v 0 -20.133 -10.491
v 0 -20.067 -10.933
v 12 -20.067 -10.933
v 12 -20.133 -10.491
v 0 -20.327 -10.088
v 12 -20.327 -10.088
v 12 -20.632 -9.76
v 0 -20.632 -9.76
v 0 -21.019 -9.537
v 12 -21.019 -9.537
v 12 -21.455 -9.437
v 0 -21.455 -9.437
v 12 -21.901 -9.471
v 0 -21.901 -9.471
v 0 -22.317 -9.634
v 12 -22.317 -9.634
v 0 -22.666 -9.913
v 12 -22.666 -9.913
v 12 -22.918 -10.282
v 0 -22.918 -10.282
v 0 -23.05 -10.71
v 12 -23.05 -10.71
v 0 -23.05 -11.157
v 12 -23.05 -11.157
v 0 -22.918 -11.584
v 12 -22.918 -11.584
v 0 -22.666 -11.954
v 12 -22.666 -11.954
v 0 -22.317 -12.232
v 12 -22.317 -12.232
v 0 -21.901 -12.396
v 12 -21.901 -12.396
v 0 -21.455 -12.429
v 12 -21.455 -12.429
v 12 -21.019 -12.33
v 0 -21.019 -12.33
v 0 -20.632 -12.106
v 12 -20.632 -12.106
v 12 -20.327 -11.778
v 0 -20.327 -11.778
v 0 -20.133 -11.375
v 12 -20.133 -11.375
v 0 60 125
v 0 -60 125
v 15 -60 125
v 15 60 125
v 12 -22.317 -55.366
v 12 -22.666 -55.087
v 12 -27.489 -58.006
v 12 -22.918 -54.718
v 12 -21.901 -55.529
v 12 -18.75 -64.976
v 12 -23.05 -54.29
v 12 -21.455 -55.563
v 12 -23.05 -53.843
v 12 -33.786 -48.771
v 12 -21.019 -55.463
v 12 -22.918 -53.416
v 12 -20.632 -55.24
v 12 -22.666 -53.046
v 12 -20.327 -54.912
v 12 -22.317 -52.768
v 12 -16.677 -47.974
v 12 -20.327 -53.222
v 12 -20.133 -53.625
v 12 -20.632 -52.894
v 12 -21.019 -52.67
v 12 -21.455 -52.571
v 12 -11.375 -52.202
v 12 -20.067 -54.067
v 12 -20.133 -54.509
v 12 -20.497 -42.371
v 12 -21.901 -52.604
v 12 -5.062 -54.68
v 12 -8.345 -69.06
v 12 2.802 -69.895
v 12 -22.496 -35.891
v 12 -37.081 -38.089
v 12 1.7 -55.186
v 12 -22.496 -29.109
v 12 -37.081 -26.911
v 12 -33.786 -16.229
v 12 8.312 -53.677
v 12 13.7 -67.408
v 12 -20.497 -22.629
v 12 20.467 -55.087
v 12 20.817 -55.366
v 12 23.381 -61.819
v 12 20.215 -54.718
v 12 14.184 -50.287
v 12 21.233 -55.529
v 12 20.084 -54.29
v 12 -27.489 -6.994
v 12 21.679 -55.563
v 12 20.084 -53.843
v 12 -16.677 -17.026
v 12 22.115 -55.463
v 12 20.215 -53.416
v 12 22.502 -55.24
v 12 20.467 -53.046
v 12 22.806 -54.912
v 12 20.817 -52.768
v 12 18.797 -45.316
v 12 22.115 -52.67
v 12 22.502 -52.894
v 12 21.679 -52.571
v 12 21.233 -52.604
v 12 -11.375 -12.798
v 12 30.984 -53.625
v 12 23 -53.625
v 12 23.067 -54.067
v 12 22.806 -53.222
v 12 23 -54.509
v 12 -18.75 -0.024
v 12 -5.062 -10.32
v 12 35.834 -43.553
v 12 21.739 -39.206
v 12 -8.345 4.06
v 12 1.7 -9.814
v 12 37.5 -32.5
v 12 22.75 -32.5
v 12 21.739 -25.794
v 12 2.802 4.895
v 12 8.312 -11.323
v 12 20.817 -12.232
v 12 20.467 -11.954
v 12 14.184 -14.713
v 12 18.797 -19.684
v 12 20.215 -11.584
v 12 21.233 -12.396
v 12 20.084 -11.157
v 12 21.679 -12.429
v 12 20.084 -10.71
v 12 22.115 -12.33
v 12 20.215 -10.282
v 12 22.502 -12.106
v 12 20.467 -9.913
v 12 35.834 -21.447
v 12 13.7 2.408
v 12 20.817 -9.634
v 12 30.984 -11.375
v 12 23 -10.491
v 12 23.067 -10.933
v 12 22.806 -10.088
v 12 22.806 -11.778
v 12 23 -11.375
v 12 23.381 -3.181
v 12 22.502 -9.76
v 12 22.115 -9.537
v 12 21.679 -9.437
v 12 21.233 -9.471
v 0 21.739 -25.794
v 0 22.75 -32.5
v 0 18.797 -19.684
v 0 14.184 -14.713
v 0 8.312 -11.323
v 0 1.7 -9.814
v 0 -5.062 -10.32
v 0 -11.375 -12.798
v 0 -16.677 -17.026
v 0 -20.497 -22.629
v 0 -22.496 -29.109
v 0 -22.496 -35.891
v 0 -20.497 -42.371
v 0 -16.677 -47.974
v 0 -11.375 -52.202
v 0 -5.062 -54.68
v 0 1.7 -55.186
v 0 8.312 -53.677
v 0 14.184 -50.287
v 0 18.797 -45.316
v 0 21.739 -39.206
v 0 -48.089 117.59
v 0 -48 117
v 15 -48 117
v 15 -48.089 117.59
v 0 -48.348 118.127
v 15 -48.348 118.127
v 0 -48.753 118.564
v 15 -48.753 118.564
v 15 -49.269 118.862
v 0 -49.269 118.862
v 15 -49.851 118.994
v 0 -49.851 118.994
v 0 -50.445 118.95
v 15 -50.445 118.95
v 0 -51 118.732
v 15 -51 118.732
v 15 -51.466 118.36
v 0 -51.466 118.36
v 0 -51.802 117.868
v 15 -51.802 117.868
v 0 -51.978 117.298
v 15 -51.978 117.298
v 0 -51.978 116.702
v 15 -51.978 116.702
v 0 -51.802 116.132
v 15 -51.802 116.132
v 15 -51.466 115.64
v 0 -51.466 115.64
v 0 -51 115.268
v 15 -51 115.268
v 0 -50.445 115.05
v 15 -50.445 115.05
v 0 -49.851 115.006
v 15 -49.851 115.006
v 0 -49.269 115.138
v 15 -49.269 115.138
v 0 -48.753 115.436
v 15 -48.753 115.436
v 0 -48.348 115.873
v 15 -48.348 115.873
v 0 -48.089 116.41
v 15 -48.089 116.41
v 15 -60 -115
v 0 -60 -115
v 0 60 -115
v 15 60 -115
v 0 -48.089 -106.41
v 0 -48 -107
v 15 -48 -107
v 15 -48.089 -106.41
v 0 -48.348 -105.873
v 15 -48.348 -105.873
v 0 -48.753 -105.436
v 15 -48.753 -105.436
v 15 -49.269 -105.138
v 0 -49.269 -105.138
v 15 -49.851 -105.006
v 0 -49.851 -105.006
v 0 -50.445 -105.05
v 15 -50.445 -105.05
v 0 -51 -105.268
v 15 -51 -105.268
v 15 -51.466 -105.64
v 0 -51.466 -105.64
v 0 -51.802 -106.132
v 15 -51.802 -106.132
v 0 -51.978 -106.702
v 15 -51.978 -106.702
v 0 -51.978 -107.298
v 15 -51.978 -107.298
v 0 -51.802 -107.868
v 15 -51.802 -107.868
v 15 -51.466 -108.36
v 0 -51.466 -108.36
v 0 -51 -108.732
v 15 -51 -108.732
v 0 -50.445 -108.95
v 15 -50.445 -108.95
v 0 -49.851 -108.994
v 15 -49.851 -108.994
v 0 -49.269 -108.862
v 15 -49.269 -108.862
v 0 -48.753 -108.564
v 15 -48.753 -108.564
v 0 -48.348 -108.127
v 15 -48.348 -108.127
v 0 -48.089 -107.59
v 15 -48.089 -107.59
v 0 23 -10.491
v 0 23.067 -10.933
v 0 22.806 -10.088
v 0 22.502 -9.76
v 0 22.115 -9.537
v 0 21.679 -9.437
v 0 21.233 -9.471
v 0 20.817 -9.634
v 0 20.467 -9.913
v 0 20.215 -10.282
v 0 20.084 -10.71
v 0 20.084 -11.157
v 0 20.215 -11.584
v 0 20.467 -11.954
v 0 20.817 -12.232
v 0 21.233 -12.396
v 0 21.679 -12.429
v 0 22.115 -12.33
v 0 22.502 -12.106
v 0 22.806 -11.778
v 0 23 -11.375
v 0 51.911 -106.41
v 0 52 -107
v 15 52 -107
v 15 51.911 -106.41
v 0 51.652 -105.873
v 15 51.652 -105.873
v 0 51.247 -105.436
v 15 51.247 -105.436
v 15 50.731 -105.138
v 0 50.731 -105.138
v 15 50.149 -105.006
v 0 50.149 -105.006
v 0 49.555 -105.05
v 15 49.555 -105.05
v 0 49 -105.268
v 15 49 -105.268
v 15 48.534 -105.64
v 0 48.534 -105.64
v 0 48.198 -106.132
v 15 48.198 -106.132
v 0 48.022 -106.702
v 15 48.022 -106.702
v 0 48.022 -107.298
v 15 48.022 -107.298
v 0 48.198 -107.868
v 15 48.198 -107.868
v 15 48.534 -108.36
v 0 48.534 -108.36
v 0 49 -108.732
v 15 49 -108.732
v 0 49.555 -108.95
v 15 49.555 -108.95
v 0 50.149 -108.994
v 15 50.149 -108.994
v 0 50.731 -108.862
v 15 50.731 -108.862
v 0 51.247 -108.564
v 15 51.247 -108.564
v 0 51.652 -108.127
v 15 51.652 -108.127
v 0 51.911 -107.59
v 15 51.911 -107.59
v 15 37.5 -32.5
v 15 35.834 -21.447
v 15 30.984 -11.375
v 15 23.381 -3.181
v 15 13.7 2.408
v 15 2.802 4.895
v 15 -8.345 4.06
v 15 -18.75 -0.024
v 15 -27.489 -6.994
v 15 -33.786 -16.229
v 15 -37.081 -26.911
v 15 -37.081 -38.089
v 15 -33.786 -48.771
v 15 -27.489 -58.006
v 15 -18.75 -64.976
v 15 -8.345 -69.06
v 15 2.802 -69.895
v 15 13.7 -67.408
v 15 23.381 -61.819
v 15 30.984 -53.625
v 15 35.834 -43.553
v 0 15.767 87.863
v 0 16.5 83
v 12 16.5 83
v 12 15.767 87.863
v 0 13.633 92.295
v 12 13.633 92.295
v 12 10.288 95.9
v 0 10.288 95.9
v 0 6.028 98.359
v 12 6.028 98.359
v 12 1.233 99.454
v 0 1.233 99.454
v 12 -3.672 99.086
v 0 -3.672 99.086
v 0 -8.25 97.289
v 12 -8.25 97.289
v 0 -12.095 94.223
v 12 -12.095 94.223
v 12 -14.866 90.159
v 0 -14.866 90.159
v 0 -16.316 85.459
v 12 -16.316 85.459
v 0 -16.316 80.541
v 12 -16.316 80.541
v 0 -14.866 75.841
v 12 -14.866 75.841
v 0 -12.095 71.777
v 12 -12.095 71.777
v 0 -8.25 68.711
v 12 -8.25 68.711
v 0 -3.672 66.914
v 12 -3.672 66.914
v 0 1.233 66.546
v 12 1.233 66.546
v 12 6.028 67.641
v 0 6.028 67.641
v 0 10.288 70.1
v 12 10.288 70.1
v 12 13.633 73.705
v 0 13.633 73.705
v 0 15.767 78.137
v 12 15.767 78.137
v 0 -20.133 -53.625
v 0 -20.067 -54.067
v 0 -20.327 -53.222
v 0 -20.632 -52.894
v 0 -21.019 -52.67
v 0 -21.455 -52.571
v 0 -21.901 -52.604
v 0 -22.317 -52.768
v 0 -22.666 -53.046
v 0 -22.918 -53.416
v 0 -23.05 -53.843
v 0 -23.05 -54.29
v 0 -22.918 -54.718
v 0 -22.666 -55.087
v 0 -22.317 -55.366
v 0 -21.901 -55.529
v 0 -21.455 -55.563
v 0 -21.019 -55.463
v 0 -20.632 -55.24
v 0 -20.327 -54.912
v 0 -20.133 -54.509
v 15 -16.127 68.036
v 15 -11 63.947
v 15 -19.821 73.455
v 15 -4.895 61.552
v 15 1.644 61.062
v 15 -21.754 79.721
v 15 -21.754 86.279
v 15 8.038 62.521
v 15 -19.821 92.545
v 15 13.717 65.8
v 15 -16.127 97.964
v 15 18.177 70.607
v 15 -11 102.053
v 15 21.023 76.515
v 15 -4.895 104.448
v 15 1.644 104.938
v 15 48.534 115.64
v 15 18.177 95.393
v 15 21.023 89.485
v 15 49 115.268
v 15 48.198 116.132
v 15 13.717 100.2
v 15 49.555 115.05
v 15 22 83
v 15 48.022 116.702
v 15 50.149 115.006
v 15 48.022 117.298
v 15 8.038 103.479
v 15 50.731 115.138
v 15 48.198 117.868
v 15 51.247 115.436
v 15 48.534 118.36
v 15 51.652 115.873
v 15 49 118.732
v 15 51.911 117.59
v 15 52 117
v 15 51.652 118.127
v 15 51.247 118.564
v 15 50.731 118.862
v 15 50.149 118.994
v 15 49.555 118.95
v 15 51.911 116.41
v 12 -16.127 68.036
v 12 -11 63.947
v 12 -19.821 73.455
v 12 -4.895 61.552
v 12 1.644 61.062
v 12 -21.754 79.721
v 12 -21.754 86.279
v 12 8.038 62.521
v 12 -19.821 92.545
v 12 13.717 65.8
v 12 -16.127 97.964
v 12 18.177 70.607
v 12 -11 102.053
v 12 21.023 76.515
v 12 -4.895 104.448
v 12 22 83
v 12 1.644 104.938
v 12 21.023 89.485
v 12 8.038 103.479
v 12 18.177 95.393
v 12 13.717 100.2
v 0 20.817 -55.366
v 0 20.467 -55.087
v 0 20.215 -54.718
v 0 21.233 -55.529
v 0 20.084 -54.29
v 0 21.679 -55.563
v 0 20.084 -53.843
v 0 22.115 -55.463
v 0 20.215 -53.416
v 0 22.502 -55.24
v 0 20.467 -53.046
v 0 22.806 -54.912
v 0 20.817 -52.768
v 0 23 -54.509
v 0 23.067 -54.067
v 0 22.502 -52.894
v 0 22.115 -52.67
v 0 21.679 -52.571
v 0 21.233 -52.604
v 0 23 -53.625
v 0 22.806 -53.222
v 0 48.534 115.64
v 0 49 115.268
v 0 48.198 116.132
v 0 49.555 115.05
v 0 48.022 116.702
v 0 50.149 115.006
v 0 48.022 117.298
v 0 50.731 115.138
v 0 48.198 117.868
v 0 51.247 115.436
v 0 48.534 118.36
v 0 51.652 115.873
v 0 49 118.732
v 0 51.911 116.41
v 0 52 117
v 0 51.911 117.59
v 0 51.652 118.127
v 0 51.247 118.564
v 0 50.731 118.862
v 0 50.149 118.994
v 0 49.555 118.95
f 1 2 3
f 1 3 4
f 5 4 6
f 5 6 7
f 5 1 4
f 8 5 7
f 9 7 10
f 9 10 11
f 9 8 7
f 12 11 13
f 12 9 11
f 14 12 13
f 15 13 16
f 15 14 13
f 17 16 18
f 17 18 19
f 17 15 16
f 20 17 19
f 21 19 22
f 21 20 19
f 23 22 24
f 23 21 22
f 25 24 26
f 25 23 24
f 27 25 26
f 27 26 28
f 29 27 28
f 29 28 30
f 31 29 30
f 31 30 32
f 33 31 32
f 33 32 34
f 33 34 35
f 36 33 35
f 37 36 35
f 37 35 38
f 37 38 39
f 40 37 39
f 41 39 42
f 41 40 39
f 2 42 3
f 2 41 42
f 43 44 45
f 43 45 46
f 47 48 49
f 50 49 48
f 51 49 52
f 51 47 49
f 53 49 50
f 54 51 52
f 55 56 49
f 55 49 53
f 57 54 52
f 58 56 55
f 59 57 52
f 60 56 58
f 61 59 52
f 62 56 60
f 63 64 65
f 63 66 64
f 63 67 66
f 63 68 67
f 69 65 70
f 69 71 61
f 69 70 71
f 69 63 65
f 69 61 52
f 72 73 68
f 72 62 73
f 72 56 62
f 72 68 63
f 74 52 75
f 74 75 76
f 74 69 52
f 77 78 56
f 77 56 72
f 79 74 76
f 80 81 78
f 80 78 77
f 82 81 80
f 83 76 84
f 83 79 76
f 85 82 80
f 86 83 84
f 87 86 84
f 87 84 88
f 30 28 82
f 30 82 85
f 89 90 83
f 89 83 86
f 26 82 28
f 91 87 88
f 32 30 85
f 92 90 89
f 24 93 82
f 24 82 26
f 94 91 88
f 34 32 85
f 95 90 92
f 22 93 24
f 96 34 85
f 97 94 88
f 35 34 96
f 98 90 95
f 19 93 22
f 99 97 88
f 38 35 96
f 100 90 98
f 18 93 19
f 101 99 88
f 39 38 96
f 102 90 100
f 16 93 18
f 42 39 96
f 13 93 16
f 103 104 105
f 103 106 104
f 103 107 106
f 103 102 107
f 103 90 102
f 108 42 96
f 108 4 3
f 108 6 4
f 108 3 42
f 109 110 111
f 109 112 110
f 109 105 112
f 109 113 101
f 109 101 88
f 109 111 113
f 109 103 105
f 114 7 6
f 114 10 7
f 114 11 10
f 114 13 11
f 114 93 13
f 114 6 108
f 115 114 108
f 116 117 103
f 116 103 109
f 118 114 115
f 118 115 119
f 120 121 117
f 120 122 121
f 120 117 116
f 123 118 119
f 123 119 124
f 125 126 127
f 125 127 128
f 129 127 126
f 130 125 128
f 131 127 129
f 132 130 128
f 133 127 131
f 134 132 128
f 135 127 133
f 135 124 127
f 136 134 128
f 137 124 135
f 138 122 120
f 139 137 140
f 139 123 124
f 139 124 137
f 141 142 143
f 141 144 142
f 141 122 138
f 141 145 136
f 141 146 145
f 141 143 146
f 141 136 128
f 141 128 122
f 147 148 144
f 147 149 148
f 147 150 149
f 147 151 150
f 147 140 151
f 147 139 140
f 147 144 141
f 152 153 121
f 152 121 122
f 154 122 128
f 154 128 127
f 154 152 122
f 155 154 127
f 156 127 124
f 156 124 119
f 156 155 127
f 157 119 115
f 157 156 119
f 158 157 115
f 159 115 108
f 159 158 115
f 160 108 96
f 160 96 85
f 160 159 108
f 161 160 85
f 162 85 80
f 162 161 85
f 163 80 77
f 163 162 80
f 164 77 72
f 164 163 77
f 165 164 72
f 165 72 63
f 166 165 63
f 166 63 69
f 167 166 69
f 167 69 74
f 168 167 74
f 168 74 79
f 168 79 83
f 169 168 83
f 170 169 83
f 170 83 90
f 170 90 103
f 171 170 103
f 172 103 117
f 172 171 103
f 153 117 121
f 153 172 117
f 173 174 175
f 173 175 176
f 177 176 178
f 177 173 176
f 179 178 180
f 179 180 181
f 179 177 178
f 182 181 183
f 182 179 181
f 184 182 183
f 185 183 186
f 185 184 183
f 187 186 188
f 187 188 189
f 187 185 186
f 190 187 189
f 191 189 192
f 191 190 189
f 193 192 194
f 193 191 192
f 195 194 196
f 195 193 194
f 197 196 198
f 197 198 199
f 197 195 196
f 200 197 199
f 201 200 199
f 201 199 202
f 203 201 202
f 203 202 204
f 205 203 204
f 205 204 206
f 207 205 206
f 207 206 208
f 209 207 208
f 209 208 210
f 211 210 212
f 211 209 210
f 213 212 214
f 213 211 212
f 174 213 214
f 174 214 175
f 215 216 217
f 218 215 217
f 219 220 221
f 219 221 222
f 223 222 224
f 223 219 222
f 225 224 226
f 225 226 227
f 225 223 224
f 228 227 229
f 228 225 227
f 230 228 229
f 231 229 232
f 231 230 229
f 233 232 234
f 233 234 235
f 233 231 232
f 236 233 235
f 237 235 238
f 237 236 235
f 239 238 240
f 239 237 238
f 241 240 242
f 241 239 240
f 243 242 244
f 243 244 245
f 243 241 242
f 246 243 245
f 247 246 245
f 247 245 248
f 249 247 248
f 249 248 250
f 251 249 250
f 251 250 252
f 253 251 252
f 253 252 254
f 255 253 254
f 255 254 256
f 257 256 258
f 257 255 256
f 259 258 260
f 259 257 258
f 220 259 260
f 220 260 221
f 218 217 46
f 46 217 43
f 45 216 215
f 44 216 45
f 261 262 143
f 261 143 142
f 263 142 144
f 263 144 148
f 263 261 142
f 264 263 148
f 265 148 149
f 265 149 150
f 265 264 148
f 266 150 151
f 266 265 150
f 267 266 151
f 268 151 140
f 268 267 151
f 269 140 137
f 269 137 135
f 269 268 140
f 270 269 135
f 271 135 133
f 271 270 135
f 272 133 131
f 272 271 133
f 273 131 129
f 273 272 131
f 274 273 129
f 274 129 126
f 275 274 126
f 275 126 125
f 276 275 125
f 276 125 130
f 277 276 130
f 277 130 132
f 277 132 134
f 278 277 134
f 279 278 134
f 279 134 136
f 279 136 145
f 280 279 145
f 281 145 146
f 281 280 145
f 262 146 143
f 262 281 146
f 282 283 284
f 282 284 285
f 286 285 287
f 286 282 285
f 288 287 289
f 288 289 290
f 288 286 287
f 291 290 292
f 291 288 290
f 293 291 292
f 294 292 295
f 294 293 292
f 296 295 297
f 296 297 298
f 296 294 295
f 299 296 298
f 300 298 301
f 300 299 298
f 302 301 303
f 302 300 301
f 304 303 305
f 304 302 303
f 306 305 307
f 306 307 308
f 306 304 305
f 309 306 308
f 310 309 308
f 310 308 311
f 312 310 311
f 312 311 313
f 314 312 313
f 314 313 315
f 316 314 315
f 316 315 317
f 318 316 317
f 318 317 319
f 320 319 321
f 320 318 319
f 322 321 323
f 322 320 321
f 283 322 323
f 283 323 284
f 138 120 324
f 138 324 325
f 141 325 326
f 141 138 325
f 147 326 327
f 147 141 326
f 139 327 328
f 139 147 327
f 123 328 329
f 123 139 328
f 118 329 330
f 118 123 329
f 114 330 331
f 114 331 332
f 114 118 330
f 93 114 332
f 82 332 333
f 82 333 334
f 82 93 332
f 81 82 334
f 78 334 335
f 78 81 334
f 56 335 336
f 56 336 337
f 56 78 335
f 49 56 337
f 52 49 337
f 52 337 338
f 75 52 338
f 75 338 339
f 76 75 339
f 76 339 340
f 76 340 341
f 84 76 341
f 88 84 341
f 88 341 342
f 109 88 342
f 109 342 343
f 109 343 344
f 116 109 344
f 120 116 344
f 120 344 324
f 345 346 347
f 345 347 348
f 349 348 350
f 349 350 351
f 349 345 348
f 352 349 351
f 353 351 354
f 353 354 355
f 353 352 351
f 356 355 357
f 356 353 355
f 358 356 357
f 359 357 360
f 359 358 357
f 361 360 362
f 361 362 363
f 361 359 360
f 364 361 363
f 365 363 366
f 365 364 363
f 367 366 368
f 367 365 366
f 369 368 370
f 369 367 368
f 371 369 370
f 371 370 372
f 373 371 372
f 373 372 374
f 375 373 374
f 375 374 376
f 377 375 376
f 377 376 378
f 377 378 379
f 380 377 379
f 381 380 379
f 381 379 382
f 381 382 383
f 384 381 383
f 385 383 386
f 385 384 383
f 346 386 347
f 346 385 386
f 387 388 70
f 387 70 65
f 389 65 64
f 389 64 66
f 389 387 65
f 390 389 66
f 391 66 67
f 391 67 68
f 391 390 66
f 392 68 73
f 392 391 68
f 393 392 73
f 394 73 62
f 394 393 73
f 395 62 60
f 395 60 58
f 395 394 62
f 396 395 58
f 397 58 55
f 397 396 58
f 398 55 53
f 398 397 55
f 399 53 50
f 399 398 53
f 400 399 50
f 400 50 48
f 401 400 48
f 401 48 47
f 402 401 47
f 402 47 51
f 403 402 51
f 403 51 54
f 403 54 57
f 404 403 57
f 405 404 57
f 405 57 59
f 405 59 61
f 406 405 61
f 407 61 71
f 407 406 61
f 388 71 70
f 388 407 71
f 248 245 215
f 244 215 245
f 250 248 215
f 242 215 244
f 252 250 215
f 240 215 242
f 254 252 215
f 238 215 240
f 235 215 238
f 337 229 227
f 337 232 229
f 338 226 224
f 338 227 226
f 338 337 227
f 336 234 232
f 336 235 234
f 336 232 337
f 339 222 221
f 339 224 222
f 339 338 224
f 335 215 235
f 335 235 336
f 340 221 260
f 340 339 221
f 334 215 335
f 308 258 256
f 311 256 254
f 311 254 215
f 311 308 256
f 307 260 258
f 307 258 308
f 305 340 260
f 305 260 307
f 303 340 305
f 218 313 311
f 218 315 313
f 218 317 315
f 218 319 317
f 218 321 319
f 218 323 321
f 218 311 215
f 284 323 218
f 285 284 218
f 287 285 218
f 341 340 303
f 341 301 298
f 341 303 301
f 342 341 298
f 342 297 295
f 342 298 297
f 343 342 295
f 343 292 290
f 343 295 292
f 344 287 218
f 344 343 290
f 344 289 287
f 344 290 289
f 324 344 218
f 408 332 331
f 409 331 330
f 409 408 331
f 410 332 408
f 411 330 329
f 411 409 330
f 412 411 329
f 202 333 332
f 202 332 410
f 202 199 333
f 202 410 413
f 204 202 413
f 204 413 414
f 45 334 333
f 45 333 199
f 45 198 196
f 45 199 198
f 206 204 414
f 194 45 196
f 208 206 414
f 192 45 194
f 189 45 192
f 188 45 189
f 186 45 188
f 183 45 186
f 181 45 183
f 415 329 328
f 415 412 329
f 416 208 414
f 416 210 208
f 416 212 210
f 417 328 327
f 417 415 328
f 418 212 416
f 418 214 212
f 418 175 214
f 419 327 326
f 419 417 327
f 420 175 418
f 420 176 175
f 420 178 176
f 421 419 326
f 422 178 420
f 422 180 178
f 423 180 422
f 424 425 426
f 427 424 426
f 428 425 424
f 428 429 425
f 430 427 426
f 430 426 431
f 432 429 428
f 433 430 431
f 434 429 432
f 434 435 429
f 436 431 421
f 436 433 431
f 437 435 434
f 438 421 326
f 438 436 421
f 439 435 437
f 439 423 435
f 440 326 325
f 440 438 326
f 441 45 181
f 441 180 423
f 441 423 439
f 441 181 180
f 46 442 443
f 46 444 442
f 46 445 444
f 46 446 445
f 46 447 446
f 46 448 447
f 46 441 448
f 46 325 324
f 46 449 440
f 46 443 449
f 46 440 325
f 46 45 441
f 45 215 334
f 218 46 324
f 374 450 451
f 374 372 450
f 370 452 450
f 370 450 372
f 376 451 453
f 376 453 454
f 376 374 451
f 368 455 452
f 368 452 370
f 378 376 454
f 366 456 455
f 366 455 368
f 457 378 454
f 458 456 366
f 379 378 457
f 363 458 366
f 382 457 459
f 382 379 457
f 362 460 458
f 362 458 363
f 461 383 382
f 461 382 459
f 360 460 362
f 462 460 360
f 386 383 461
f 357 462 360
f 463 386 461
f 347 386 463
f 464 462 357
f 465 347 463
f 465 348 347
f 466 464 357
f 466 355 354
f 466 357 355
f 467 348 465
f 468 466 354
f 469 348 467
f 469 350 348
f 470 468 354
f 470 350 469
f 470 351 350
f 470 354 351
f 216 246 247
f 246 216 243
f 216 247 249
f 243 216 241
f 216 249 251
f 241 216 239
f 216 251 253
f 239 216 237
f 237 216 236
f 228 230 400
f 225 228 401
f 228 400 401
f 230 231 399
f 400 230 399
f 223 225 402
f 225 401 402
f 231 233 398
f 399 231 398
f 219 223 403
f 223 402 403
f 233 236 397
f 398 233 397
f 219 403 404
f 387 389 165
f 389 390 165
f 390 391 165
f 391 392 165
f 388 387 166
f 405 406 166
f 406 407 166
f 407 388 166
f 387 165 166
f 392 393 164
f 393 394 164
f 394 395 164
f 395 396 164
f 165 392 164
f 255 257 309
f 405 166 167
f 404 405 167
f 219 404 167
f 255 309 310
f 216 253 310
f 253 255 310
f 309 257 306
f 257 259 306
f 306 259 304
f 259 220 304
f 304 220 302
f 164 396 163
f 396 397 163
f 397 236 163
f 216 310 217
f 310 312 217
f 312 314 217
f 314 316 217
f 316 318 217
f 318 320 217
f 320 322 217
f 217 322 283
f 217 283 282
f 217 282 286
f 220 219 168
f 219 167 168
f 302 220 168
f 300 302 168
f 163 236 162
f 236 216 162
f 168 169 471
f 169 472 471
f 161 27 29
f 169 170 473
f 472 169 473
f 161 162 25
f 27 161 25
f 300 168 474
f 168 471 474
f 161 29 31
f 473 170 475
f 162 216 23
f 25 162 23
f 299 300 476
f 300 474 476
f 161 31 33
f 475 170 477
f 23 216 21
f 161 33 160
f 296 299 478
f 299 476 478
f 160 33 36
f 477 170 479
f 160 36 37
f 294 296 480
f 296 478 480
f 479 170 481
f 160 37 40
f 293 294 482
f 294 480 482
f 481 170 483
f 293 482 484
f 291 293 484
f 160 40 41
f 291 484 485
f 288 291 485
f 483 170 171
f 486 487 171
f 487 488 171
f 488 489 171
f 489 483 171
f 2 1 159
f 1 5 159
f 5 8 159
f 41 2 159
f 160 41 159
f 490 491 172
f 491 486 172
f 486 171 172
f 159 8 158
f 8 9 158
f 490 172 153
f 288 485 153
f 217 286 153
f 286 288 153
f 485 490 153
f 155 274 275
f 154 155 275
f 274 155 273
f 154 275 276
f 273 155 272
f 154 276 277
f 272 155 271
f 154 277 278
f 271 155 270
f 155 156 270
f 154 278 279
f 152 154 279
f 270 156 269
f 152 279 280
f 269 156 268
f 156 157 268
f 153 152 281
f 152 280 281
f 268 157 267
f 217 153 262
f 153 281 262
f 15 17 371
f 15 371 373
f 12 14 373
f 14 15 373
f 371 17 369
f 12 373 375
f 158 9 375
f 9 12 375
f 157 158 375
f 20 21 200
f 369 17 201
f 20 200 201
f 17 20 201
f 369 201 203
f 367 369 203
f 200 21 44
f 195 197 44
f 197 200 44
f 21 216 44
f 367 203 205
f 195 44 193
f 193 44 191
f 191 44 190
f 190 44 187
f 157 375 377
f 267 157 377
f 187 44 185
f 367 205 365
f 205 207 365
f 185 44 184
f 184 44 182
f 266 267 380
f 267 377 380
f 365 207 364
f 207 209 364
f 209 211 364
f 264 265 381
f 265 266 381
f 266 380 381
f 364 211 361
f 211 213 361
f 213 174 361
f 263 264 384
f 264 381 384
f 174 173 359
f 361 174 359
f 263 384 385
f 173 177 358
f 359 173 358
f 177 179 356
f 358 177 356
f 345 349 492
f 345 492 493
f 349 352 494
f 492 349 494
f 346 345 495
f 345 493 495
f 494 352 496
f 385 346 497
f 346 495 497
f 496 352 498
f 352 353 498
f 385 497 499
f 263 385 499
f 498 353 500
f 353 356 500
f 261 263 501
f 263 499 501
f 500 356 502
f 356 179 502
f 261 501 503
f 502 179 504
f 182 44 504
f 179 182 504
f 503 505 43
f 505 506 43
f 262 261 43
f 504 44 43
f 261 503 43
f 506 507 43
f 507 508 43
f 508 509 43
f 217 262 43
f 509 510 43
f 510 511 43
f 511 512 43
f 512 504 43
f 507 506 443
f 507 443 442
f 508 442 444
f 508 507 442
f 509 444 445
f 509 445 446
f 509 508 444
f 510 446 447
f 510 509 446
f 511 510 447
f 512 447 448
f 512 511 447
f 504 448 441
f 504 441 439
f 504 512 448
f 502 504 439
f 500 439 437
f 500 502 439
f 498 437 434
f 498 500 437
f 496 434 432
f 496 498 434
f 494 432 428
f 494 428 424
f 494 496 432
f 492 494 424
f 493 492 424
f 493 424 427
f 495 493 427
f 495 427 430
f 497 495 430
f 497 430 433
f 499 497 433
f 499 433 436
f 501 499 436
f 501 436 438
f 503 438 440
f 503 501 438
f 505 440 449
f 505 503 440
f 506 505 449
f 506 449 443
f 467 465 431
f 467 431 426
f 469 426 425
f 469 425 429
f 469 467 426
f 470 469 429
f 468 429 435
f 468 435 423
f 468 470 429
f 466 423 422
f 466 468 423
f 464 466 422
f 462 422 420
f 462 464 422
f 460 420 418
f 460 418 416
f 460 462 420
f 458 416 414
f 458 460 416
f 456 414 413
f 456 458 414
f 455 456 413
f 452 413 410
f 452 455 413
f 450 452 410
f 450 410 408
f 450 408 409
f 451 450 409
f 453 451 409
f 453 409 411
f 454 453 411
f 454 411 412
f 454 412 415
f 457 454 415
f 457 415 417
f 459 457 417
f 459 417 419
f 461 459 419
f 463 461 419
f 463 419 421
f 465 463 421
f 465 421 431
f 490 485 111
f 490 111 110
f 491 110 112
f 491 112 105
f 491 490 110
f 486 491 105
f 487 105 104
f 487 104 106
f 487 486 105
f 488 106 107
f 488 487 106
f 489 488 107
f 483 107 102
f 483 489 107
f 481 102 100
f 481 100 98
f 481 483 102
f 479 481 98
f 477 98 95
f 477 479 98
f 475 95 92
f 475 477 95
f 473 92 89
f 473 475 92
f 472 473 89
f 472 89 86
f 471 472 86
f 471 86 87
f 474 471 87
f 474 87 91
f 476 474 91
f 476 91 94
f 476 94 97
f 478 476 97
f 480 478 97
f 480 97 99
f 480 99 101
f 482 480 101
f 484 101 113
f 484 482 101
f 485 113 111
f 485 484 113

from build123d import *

# Parameters (mm, degrees)
F0_W     = 120
F0_H     = 240
F0_R     = 2
F0_R_2   = 37.5
F0_R_3   = 22
F1_DEPTH = 15
F0_R_4   = 16.5
F0_R_5   = 1.5
F0_R_6   = 22.75
F2_DEPTH = 12


with BuildPart() as f1:
    # F0 (on Right) → F1 (new body)
    with BuildSketch(Plane.YZ):
        with Locations((0, 5)):
            Rectangle(F0_W, F0_H)
        with Locations((-49.999999, -107)):
            Circle(F0_R, mode=Mode.SUBTRACT)
        with Locations((50.000001, -107)):
            Circle(F0_R, mode=Mode.SUBTRACT)
        with Locations((0, -32.5)):
            Circle(F0_R_2, mode=Mode.SUBTRACT)
        with Locations((-49.999999, 117)):
            Circle(F0_R, mode=Mode.SUBTRACT)
        with Locations((0, 83)):
            Circle(F0_R_3, mode=Mode.SUBTRACT)
        with Locations((50.000001, 117.000003)):
            Circle(F0_R, mode=Mode.SUBTRACT)
    extrude(amount=F1_DEPTH)

    # F0 (on Right) → F2 (join)
    with BuildSketch(Plane.YZ):
        with Locations((0, 83)):
            Circle(F0_R_3)
        with Locations((0, 83)):
            Circle(F0_R_4, mode=Mode.SUBTRACT)
        with Locations((0, -32.5)):
            Circle(F0_R_2)
        with Locations((-21.566757, -54.066757)):
            Circle(F0_R_5, mode=Mode.SUBTRACT)
        with Locations((-21.566757, -10.933243)):
            Circle(F0_R_5, mode=Mode.SUBTRACT)
        with Locations((0, -32.5)):
            Circle(F0_R_6, mode=Mode.SUBTRACT)
        with Locations((21.566757, -54.066757)):
            Circle(F0_R_5, mode=Mode.SUBTRACT)
        with Locations((21.566757, -10.933243)):
            Circle(F0_R_5, mode=Mode.SUBTRACT)
    extrude(amount=F2_DEPTH)


solid = f1.part
